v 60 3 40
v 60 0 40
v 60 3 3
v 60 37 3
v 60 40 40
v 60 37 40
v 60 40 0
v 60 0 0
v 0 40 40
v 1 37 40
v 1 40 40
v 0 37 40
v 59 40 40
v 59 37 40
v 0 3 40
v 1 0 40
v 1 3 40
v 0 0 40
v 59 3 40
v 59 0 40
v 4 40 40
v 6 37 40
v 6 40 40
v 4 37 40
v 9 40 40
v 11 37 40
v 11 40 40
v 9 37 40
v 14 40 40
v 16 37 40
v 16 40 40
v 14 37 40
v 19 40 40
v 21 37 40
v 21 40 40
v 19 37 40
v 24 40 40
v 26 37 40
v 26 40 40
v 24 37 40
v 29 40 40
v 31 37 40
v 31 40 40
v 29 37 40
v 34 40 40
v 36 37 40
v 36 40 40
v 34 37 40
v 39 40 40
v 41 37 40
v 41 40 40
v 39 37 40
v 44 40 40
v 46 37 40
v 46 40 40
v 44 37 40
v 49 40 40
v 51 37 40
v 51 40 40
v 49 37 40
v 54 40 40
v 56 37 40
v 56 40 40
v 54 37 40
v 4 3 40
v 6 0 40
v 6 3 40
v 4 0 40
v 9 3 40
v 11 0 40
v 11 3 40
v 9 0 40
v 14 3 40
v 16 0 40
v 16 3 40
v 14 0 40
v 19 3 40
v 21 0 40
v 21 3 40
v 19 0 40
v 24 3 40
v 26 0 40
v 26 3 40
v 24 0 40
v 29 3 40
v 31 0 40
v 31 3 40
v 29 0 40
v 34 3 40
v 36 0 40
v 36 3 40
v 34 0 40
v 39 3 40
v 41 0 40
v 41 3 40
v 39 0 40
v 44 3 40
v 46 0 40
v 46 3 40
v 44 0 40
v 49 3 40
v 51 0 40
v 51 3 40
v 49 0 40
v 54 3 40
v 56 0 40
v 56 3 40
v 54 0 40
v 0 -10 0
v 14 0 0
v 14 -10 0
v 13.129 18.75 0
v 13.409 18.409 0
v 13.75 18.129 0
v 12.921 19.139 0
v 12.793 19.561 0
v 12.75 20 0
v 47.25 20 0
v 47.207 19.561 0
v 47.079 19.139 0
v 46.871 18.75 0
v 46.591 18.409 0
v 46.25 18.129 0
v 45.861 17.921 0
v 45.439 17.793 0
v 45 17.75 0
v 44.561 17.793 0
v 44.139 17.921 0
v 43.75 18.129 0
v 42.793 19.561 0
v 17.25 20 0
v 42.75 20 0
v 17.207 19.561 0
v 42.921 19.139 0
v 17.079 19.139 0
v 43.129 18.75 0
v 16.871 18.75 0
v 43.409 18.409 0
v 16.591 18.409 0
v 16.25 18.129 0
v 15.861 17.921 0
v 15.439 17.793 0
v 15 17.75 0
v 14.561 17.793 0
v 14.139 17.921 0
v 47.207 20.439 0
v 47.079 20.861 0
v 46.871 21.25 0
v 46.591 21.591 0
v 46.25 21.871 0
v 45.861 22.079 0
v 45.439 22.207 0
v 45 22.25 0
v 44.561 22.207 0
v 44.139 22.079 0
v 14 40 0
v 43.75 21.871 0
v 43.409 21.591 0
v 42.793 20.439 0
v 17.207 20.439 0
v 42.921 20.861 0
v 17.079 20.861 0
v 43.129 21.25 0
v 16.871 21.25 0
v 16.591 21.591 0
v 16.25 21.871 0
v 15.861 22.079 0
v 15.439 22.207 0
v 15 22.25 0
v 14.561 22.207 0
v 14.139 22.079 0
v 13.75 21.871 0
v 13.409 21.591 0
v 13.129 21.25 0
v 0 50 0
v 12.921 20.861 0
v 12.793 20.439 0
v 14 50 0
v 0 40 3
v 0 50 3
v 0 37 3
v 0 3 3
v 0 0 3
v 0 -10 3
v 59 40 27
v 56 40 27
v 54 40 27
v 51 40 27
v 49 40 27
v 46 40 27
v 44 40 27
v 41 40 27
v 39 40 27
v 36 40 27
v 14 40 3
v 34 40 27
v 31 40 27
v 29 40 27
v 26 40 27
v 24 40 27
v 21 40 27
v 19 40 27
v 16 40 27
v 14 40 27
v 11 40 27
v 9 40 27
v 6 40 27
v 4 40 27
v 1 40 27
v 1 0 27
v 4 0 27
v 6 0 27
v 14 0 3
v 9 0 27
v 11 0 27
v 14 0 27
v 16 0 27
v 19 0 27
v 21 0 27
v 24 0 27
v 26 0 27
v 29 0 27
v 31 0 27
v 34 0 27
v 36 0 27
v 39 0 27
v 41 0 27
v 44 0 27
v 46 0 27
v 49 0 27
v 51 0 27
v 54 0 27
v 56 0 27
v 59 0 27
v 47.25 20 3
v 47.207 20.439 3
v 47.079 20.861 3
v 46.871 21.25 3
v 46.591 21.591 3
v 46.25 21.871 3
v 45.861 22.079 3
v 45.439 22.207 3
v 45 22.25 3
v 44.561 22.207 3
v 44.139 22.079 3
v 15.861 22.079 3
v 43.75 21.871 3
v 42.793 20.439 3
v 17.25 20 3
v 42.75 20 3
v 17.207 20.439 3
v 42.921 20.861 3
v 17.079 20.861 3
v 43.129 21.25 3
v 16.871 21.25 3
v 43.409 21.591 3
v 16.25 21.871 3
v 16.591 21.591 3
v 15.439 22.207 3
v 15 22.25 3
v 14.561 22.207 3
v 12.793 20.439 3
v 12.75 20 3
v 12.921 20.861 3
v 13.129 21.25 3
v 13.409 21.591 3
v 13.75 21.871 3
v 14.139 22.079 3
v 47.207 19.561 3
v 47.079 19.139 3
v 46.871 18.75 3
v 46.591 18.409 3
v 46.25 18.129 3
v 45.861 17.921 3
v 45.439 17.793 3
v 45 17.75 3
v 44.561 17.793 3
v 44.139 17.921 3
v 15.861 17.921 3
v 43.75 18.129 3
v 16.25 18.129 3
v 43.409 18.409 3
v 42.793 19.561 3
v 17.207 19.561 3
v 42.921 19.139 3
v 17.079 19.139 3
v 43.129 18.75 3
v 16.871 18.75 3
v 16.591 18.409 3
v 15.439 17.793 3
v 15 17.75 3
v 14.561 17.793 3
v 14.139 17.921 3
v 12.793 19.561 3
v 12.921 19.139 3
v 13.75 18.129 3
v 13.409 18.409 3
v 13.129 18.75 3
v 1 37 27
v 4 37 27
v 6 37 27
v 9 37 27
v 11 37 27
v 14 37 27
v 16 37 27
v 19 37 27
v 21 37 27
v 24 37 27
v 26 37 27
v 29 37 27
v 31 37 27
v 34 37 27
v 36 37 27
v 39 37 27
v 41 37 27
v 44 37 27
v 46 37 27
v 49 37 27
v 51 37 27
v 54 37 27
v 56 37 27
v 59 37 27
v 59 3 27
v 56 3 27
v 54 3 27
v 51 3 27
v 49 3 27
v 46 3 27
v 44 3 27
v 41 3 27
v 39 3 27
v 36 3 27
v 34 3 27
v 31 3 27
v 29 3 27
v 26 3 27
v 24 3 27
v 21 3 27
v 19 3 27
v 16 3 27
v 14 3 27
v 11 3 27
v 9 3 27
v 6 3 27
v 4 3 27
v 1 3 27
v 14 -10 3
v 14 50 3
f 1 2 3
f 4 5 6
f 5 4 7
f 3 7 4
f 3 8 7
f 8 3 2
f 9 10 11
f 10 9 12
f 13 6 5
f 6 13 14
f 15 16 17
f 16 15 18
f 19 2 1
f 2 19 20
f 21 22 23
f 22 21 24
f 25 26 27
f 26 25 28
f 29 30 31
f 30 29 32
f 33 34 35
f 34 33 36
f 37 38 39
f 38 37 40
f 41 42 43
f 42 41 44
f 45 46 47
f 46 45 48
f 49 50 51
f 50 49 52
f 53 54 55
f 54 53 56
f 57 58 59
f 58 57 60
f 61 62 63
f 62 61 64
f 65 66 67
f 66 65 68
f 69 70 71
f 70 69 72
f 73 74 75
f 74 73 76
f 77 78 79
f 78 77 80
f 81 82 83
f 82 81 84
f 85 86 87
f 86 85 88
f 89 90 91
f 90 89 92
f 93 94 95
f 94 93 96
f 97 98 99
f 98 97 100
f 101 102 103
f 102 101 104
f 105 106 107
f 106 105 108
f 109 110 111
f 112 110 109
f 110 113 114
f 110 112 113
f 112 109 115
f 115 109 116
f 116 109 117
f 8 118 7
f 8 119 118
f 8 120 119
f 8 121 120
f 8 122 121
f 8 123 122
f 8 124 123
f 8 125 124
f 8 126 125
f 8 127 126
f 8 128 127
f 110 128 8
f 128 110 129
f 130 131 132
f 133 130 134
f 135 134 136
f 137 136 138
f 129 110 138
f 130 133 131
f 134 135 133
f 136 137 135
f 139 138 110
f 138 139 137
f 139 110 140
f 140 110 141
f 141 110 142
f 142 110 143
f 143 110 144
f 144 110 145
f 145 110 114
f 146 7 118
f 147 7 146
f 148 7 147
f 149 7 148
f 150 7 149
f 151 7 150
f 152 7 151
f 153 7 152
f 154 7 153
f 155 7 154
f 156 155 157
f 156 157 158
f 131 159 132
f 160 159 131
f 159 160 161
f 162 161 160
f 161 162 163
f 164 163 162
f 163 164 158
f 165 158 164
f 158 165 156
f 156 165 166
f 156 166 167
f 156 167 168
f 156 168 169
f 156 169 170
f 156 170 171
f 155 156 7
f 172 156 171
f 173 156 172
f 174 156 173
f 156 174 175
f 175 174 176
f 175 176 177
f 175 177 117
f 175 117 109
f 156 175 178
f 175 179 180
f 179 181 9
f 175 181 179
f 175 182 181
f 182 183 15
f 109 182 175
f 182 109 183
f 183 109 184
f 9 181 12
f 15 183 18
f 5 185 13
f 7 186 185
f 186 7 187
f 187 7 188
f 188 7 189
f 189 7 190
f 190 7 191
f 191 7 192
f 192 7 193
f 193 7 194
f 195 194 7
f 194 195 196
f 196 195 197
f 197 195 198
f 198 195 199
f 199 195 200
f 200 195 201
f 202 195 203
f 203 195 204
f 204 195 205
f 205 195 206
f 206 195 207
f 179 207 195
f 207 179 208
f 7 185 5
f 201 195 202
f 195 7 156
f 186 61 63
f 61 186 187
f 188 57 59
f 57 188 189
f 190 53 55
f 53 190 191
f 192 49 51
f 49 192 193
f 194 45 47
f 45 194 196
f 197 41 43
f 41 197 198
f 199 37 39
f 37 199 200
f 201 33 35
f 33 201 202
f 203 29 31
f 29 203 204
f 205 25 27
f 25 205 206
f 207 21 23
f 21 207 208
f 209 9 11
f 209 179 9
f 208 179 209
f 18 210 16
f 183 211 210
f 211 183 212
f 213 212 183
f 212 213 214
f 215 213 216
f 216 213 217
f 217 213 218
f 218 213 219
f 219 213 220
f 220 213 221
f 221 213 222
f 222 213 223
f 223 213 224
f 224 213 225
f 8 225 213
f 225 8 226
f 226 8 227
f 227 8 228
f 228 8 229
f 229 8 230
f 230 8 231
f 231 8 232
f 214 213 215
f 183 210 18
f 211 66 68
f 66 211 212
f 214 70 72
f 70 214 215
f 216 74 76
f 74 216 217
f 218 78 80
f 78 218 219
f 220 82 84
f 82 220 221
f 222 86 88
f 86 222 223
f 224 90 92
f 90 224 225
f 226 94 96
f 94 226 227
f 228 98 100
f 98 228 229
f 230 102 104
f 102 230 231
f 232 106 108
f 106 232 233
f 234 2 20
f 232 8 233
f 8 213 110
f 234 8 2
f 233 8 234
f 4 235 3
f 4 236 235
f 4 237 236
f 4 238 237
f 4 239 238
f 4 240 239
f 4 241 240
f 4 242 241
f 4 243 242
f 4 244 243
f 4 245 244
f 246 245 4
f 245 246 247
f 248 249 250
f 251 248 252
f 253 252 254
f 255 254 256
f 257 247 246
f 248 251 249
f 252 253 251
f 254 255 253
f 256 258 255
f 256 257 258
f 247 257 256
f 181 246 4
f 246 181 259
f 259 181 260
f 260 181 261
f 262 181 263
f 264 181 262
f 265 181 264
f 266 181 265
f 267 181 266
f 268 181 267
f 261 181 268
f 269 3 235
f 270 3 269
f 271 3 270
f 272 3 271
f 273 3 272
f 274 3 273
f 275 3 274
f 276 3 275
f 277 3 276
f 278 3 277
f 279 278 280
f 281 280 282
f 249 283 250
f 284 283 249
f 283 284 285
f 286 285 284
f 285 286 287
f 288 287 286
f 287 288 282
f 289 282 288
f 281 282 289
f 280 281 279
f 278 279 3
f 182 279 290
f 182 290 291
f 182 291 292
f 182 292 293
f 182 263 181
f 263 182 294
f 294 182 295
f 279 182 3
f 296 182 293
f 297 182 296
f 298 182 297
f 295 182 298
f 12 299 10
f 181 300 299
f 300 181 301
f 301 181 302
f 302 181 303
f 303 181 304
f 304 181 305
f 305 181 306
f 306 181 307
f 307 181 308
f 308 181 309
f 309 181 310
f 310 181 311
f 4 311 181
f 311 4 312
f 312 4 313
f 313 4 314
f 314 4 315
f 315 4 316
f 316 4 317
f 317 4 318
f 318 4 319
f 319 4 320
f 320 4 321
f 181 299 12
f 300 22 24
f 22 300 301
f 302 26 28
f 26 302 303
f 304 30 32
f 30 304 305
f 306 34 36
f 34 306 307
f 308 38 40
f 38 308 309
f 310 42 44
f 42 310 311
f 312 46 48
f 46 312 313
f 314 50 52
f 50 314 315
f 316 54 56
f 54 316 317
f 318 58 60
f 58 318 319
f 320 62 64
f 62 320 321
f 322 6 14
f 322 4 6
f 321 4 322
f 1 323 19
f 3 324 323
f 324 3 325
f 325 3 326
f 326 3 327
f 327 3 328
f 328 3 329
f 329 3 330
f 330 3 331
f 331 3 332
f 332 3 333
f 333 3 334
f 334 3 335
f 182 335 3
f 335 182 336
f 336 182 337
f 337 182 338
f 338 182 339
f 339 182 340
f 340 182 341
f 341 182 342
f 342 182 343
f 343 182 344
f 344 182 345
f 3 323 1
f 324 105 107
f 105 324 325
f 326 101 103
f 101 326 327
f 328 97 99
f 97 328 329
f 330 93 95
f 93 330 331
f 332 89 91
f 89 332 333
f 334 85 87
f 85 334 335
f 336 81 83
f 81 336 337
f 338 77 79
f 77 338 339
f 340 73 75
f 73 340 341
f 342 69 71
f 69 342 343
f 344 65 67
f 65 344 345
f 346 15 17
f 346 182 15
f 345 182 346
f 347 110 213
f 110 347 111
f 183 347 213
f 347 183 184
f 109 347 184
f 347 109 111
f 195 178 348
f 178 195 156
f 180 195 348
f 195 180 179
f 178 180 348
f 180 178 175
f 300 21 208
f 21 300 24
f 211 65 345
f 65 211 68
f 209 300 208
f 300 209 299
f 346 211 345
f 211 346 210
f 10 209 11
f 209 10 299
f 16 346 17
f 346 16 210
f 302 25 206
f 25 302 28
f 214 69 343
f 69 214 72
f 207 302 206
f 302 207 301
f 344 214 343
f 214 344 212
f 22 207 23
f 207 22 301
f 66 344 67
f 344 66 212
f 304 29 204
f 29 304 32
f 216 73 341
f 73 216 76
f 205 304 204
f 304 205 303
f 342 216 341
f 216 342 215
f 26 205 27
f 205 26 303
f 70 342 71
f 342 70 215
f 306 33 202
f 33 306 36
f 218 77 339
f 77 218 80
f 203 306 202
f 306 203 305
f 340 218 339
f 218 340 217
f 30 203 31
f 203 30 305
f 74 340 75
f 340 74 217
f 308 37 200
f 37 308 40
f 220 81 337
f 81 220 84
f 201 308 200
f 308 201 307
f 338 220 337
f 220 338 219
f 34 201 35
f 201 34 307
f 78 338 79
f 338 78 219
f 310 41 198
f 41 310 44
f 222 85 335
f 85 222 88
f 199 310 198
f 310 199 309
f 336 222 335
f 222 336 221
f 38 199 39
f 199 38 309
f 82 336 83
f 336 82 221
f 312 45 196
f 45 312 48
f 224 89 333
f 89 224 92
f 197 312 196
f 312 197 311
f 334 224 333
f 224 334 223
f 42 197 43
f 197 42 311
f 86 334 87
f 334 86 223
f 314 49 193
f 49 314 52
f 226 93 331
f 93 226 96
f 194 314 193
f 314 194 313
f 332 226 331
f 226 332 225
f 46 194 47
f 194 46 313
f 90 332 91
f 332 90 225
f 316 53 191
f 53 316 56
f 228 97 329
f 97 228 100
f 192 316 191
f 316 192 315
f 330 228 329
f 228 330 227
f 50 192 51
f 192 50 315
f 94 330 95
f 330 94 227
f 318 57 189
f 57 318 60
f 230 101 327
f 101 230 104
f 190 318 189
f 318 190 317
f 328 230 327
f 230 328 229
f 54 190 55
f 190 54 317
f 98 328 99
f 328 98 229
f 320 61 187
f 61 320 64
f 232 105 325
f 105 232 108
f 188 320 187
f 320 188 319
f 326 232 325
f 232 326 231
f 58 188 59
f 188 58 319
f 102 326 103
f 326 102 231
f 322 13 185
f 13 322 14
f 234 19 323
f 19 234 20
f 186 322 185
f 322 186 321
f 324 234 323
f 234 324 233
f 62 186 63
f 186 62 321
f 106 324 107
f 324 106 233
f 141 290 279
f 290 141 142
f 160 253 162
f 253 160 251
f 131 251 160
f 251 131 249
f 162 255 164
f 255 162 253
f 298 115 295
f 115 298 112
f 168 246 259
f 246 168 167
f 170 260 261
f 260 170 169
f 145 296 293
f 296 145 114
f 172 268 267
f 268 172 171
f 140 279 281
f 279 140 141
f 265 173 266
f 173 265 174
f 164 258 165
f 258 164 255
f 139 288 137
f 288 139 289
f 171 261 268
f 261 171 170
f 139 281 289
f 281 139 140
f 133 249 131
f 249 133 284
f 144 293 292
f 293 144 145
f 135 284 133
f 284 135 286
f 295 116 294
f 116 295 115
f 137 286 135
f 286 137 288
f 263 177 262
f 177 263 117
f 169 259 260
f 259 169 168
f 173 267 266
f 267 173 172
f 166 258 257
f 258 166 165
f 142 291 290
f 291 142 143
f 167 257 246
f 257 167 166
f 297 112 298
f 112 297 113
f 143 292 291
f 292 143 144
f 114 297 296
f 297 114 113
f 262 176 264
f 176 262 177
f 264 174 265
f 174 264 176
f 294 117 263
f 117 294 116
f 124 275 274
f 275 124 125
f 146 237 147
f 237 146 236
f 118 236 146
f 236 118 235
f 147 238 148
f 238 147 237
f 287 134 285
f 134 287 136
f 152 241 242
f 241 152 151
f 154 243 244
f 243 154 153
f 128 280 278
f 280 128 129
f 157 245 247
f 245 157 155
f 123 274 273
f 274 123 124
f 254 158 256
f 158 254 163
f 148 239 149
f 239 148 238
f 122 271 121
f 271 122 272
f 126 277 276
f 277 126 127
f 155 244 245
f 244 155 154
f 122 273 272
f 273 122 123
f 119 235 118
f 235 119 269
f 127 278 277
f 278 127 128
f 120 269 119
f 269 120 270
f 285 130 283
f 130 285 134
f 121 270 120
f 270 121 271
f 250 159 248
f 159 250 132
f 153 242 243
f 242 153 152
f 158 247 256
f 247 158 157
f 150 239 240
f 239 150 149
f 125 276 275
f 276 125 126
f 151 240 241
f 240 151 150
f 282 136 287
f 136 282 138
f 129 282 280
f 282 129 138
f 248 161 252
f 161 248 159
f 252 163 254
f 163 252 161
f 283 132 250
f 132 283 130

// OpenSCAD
$fn = 32;

// ----------------------------------------------------------------------
// Cable duct: 60 x 40 x 40 mm, 12 fingers
// ----------------------------------------------------------------------

// --- parameters (mm) ---
tray_len = 60;            // duct length, X
tray_w = 40;              // duct width, Y
tray_h = 40;              // duct height, Z
tray_t = 3;               // side wall thickness
floor_t = 3;              // floor thickness
slot_w = 3;               // finger slot width
slot_h = 24;              // finger slot height
fingers = 12;             // number of finger slots per side
pitch = 5;                // finger pitch
hole_d = 4.5;             // floor mounting hole
hole_n = 2;               // mounting holes in the floor
ear_w = 11;               // mounting ear width
ear_l = 14;               // mounting ear length

module shell() {
  difference() {
    cube([tray_len, tray_w, tray_h]);
    /* open top channel */
    translate([-tray_t - 1, tray_t, floor_t])
      cube([tray_len + 2 * tray_t + 2, tray_w - 2 * tray_t, tray_h + 1]);
  }
}

module ears() {
  translate([0, -ear_w + 1, 0]) cube([ear_l, ear_w, floor_t]);
  translate([0, tray_w - 1, 0]) cube([ear_l, ear_w, floor_t]);
}

difference() {
  union() {
    shell();
    ears();
  }
  /* finger slots cut through both side walls */
  for (i = [0 : fingers - 1]) translate([pitch / 2 + i * pitch - slot_w / 2, -1, floor_t + slot_h]) cube([slot_w, tray_w + 2, tray_h]);
  for (i = [0 : hole_n - 1]) translate([(tray_len / hole_n) * (i + 0.5), tray_w / 2, -1]) cylinder(h = floor_t + 2, d = hole_d);
}
